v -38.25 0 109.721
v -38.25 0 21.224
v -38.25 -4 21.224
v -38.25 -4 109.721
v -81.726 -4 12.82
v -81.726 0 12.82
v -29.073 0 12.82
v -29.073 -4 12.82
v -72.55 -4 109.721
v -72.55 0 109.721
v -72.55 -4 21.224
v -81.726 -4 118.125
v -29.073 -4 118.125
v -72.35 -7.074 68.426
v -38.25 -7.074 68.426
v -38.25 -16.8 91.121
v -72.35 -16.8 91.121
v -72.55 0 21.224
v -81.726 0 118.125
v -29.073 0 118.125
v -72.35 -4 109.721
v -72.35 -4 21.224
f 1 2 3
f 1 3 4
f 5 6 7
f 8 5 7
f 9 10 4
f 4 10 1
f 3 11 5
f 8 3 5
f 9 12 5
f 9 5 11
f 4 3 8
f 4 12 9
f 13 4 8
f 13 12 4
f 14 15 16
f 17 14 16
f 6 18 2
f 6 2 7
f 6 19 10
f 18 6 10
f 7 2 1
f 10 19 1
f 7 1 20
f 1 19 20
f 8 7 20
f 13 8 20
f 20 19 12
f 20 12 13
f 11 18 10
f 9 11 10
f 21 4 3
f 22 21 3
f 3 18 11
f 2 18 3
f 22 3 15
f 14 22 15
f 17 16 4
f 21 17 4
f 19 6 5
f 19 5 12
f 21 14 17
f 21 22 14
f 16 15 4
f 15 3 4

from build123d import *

# Parameters (mm, degrees)
F0_W     = 52.65262
F0_H     = 105.305238
F0_W_2   = 34.300394
F0_H_2   = 88.497445
F1_DEPTH = 4
F3_DEPTH = 34.1


with BuildPart() as f1:
    # F0 (on Front) → F1 (new body)
    with BuildSketch(Plane.XZ):
        with Locations((-55.399712, 65.472387)):
            Rectangle(F0_W, F0_H)
        with Locations((-55.399712, 65.472386)):
            Rectangle(F0_W_2, F0_H_2, mode=Mode.SUBTRACT)
    extrude(amount=F1_DEPTH)


with BuildPart() as f3:
    # F2 (on face) → F3 (new body)
    with BuildSketch(Plane(origin=(-38.249515, 0, 0), x_dir=(0, -1, 0), z_dir=(-1, 0, 0))):
        Polygon((16.800193, 91.121189), (4, 109.721109), (4, 21.223664), (7.073762, 68.426192), align=None)
    extrude(amount=F3_DEPTH)


solid = Compound([f1.part, f3.part])
